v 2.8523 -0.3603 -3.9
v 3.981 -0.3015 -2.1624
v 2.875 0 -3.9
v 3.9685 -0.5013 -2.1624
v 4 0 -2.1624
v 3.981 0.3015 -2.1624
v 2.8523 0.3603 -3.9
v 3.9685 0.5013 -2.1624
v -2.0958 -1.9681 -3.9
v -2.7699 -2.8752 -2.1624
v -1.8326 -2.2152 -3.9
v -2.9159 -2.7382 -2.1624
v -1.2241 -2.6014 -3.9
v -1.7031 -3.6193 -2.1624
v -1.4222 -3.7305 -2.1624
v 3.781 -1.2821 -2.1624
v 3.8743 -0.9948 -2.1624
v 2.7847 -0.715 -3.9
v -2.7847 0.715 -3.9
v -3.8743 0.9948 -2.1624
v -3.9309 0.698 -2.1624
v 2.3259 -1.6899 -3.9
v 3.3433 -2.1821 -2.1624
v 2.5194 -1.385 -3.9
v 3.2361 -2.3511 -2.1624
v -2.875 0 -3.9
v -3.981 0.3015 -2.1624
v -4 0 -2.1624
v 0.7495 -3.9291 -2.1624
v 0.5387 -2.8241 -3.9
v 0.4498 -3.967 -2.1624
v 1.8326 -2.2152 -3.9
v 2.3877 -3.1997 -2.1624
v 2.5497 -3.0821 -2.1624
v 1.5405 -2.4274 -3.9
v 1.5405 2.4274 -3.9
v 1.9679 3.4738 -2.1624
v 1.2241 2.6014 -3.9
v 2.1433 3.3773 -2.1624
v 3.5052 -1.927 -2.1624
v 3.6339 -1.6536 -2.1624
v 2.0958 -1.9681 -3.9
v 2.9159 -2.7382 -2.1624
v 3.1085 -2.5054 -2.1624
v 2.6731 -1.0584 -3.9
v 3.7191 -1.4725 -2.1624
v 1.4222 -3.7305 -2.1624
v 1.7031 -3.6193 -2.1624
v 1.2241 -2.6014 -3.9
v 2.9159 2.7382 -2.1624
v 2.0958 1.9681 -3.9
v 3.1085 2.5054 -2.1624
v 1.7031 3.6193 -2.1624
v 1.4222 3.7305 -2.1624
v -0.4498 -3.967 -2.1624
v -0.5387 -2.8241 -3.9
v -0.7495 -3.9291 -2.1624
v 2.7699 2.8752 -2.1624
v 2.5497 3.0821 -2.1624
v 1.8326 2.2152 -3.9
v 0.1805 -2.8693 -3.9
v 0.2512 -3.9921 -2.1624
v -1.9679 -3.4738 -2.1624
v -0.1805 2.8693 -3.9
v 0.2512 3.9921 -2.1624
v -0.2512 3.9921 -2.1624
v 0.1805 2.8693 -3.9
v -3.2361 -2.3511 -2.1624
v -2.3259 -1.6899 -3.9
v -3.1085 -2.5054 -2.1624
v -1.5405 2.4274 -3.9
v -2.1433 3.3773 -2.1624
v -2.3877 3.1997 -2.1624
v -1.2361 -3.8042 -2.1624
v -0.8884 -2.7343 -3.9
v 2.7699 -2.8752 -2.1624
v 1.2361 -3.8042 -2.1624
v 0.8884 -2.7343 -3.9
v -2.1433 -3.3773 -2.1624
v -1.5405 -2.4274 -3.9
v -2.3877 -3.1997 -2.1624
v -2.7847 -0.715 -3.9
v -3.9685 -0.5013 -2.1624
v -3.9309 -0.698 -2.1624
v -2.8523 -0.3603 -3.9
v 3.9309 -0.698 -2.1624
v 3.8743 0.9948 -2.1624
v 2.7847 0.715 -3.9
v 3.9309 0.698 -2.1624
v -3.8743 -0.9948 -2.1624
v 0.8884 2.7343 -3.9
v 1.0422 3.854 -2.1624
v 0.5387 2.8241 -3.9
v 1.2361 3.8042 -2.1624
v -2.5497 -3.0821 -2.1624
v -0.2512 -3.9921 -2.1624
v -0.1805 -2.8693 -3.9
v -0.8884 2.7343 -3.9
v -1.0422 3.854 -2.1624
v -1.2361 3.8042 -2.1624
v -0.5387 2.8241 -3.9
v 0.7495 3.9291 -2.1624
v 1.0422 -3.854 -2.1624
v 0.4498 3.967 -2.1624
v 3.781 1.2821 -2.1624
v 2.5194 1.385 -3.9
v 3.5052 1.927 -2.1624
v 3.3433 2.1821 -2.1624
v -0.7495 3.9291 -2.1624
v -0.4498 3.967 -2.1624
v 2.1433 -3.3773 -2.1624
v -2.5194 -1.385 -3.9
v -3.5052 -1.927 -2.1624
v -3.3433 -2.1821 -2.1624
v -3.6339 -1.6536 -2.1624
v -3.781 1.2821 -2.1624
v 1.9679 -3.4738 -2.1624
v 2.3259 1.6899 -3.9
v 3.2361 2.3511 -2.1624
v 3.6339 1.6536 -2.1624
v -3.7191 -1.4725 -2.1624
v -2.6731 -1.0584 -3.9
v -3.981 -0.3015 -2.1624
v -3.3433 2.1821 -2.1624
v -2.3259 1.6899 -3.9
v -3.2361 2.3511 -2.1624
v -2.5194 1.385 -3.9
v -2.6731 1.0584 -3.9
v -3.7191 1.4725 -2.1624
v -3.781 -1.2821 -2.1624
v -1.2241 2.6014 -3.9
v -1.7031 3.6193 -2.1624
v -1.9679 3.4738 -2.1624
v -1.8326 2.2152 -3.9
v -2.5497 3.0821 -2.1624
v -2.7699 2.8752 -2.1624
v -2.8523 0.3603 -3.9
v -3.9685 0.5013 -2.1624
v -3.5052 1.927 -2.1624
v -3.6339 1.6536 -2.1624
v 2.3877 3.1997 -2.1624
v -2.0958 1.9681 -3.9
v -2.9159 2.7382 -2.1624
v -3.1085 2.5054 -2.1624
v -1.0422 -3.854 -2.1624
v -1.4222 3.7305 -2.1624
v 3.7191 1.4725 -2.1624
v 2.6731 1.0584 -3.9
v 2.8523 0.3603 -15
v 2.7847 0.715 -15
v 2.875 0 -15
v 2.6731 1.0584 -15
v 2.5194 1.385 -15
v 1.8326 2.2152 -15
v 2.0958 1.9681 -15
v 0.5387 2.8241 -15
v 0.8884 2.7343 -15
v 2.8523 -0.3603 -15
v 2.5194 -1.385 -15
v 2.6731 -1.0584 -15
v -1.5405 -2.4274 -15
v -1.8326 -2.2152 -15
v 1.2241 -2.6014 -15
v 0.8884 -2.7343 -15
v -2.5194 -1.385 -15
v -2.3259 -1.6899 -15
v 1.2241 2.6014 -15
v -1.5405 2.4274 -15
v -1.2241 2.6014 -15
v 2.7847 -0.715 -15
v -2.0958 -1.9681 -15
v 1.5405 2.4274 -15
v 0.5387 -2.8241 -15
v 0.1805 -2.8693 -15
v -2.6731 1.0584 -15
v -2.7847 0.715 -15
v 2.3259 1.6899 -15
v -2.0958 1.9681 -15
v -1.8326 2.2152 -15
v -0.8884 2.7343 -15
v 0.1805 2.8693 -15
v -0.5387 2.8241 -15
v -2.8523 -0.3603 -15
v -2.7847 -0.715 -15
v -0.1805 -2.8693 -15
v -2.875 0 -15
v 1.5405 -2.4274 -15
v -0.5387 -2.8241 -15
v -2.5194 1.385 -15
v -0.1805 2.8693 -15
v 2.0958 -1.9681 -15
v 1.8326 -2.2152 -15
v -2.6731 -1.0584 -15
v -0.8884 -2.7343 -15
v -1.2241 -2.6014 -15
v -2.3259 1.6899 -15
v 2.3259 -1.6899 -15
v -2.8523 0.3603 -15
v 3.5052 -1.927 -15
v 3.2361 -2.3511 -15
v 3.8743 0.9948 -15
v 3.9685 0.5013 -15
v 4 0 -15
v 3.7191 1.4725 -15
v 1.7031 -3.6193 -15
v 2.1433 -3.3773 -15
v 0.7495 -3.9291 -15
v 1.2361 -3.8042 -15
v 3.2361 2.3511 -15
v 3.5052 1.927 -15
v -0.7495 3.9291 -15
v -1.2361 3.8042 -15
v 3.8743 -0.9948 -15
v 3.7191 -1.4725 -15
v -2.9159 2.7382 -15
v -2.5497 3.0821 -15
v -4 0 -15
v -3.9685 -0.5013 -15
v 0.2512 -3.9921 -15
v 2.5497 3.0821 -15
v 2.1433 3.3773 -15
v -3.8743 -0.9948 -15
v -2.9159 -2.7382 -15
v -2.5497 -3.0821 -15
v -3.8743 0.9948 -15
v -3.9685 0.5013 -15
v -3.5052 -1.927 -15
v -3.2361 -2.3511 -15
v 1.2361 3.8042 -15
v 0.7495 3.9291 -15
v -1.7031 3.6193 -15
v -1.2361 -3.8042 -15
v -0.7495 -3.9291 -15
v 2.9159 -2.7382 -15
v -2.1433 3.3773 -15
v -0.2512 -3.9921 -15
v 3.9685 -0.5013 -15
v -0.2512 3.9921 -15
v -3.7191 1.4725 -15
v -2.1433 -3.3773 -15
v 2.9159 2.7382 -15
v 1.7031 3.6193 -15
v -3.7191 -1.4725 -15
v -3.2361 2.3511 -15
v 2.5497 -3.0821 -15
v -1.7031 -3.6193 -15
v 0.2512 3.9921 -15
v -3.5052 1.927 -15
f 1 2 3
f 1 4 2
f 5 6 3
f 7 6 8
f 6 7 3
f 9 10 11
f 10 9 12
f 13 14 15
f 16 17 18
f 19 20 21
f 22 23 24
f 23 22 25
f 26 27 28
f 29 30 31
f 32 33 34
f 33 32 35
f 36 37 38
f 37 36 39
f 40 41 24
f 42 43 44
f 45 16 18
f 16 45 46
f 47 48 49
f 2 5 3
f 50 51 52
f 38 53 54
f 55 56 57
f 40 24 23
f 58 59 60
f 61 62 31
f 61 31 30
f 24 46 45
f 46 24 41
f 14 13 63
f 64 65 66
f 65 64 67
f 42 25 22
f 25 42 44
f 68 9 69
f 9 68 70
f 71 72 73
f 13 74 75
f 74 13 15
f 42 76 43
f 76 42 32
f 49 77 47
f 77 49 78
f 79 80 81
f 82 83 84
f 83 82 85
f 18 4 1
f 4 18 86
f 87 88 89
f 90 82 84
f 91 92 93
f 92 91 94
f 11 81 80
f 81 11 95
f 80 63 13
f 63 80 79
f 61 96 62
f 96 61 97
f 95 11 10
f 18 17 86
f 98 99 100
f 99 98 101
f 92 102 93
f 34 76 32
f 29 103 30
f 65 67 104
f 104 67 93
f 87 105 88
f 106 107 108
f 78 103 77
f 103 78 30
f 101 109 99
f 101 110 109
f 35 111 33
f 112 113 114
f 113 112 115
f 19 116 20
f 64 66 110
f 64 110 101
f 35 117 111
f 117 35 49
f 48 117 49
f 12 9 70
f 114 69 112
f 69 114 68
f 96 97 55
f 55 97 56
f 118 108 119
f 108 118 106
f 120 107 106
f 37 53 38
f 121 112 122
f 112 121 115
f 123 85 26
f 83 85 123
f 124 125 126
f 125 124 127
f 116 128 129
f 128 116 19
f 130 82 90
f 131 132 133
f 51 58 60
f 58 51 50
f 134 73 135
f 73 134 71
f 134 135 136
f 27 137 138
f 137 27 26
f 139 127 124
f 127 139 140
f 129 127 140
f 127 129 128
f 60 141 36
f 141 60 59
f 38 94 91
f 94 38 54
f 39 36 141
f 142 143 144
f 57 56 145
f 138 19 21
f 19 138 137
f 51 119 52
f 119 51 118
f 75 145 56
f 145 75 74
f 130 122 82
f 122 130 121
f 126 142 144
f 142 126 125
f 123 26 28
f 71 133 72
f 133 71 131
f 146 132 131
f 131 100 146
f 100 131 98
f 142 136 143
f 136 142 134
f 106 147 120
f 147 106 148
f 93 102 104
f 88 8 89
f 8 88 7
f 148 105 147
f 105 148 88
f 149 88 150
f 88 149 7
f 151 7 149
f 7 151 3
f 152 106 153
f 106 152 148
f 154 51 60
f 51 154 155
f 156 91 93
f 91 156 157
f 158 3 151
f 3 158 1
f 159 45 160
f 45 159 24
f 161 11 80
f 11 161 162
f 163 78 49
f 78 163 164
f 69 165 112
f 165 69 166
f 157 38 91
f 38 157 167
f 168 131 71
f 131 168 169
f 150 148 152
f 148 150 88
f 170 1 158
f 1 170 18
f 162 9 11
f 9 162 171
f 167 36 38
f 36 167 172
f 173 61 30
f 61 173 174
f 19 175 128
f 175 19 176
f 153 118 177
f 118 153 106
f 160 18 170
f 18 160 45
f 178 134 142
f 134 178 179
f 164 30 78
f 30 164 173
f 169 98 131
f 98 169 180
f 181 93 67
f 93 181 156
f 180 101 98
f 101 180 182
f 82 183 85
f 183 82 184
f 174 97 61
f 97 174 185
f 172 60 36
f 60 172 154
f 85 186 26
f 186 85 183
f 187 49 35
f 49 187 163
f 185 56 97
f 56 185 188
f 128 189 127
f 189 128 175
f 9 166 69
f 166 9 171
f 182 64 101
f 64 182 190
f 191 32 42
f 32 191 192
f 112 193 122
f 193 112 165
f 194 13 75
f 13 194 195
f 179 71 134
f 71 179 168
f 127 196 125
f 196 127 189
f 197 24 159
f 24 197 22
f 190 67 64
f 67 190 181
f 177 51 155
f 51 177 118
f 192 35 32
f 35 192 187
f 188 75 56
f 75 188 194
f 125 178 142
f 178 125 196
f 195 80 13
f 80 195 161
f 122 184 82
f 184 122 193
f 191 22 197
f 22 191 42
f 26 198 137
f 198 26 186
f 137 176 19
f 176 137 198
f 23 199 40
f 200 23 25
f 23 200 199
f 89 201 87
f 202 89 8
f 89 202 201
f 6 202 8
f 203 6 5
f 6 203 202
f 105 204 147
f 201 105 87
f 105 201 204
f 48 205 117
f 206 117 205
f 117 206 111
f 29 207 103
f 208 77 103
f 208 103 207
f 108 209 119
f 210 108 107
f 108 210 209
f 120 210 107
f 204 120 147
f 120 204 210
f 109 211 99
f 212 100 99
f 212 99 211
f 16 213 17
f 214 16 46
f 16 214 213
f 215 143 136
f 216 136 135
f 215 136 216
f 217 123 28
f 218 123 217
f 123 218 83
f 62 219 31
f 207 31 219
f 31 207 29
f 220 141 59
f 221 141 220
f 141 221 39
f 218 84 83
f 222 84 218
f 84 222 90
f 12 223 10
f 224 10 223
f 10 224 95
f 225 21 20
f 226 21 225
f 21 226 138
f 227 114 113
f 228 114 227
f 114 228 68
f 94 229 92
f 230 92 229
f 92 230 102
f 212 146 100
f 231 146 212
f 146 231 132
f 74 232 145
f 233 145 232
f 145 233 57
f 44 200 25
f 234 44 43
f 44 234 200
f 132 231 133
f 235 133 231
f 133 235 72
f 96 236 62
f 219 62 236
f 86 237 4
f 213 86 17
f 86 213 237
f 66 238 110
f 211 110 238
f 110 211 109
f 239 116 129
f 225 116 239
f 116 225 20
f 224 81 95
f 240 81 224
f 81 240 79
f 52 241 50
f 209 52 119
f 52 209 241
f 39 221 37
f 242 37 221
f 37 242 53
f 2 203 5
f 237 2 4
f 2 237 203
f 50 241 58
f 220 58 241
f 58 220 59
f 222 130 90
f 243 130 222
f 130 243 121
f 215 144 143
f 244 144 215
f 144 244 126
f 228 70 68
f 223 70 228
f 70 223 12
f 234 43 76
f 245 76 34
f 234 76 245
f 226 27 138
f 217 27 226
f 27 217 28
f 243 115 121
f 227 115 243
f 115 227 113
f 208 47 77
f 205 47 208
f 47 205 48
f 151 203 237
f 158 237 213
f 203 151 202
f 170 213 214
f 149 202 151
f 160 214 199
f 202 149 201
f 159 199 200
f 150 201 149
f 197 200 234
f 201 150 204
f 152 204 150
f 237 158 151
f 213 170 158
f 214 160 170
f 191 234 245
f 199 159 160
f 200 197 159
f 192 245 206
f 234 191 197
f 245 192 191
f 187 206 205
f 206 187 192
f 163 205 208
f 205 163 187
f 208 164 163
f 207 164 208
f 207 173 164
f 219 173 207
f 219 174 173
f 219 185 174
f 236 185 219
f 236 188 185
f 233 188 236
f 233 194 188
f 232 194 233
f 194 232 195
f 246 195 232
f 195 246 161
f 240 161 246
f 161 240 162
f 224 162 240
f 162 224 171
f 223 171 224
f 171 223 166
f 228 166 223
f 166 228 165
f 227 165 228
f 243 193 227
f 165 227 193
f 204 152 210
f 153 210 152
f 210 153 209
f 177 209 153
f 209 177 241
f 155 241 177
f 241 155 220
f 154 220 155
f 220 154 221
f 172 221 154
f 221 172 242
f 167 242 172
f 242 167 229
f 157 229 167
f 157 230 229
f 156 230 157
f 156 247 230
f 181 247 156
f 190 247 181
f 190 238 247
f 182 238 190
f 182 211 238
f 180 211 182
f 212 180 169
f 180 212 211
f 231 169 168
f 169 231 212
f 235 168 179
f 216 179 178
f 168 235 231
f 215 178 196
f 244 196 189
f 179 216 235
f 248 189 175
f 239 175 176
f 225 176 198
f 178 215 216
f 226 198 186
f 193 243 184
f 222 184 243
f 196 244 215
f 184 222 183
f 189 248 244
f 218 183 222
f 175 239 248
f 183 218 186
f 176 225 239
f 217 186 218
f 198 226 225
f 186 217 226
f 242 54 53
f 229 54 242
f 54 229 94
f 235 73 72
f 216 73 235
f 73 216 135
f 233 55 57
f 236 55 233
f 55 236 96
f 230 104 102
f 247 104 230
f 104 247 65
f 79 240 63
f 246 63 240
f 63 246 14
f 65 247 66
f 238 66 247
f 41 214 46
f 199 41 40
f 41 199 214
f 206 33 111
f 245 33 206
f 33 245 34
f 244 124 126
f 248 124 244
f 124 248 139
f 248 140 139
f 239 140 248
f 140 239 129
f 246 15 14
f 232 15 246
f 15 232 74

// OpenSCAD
$fn = 50;

difference() {
	union() {
		translate(v = [0, 0, -15.0]) {
			cylinder(h = 18, r = 4.0);
		}
	}
	union() {
		translate(v = [0, 0, 0]) {
			rotate(a = [0, 0, 0]) {
				difference() {
					union() {
						translate(v = [0, 0, -18.0]) {
							cylinder(h = 18, r = 2.6);
						}
						translate(v = [0, 0, -3.9]) {
							cylinder(h = 3.9, r1 = 2.875, r2 = 5.4);
						}
						translate(v = [0, 0, -18.0]) {
							cylinder(h = 18, r = 2.875);
						}
						translate(v = [0, 0, -18.0]) {
							cylinder(h = 18, r = 2.6);
						}
					}
					union();
				}
			}
		}
		#cylinder(h = 3, r = 5.0);
	}
}
